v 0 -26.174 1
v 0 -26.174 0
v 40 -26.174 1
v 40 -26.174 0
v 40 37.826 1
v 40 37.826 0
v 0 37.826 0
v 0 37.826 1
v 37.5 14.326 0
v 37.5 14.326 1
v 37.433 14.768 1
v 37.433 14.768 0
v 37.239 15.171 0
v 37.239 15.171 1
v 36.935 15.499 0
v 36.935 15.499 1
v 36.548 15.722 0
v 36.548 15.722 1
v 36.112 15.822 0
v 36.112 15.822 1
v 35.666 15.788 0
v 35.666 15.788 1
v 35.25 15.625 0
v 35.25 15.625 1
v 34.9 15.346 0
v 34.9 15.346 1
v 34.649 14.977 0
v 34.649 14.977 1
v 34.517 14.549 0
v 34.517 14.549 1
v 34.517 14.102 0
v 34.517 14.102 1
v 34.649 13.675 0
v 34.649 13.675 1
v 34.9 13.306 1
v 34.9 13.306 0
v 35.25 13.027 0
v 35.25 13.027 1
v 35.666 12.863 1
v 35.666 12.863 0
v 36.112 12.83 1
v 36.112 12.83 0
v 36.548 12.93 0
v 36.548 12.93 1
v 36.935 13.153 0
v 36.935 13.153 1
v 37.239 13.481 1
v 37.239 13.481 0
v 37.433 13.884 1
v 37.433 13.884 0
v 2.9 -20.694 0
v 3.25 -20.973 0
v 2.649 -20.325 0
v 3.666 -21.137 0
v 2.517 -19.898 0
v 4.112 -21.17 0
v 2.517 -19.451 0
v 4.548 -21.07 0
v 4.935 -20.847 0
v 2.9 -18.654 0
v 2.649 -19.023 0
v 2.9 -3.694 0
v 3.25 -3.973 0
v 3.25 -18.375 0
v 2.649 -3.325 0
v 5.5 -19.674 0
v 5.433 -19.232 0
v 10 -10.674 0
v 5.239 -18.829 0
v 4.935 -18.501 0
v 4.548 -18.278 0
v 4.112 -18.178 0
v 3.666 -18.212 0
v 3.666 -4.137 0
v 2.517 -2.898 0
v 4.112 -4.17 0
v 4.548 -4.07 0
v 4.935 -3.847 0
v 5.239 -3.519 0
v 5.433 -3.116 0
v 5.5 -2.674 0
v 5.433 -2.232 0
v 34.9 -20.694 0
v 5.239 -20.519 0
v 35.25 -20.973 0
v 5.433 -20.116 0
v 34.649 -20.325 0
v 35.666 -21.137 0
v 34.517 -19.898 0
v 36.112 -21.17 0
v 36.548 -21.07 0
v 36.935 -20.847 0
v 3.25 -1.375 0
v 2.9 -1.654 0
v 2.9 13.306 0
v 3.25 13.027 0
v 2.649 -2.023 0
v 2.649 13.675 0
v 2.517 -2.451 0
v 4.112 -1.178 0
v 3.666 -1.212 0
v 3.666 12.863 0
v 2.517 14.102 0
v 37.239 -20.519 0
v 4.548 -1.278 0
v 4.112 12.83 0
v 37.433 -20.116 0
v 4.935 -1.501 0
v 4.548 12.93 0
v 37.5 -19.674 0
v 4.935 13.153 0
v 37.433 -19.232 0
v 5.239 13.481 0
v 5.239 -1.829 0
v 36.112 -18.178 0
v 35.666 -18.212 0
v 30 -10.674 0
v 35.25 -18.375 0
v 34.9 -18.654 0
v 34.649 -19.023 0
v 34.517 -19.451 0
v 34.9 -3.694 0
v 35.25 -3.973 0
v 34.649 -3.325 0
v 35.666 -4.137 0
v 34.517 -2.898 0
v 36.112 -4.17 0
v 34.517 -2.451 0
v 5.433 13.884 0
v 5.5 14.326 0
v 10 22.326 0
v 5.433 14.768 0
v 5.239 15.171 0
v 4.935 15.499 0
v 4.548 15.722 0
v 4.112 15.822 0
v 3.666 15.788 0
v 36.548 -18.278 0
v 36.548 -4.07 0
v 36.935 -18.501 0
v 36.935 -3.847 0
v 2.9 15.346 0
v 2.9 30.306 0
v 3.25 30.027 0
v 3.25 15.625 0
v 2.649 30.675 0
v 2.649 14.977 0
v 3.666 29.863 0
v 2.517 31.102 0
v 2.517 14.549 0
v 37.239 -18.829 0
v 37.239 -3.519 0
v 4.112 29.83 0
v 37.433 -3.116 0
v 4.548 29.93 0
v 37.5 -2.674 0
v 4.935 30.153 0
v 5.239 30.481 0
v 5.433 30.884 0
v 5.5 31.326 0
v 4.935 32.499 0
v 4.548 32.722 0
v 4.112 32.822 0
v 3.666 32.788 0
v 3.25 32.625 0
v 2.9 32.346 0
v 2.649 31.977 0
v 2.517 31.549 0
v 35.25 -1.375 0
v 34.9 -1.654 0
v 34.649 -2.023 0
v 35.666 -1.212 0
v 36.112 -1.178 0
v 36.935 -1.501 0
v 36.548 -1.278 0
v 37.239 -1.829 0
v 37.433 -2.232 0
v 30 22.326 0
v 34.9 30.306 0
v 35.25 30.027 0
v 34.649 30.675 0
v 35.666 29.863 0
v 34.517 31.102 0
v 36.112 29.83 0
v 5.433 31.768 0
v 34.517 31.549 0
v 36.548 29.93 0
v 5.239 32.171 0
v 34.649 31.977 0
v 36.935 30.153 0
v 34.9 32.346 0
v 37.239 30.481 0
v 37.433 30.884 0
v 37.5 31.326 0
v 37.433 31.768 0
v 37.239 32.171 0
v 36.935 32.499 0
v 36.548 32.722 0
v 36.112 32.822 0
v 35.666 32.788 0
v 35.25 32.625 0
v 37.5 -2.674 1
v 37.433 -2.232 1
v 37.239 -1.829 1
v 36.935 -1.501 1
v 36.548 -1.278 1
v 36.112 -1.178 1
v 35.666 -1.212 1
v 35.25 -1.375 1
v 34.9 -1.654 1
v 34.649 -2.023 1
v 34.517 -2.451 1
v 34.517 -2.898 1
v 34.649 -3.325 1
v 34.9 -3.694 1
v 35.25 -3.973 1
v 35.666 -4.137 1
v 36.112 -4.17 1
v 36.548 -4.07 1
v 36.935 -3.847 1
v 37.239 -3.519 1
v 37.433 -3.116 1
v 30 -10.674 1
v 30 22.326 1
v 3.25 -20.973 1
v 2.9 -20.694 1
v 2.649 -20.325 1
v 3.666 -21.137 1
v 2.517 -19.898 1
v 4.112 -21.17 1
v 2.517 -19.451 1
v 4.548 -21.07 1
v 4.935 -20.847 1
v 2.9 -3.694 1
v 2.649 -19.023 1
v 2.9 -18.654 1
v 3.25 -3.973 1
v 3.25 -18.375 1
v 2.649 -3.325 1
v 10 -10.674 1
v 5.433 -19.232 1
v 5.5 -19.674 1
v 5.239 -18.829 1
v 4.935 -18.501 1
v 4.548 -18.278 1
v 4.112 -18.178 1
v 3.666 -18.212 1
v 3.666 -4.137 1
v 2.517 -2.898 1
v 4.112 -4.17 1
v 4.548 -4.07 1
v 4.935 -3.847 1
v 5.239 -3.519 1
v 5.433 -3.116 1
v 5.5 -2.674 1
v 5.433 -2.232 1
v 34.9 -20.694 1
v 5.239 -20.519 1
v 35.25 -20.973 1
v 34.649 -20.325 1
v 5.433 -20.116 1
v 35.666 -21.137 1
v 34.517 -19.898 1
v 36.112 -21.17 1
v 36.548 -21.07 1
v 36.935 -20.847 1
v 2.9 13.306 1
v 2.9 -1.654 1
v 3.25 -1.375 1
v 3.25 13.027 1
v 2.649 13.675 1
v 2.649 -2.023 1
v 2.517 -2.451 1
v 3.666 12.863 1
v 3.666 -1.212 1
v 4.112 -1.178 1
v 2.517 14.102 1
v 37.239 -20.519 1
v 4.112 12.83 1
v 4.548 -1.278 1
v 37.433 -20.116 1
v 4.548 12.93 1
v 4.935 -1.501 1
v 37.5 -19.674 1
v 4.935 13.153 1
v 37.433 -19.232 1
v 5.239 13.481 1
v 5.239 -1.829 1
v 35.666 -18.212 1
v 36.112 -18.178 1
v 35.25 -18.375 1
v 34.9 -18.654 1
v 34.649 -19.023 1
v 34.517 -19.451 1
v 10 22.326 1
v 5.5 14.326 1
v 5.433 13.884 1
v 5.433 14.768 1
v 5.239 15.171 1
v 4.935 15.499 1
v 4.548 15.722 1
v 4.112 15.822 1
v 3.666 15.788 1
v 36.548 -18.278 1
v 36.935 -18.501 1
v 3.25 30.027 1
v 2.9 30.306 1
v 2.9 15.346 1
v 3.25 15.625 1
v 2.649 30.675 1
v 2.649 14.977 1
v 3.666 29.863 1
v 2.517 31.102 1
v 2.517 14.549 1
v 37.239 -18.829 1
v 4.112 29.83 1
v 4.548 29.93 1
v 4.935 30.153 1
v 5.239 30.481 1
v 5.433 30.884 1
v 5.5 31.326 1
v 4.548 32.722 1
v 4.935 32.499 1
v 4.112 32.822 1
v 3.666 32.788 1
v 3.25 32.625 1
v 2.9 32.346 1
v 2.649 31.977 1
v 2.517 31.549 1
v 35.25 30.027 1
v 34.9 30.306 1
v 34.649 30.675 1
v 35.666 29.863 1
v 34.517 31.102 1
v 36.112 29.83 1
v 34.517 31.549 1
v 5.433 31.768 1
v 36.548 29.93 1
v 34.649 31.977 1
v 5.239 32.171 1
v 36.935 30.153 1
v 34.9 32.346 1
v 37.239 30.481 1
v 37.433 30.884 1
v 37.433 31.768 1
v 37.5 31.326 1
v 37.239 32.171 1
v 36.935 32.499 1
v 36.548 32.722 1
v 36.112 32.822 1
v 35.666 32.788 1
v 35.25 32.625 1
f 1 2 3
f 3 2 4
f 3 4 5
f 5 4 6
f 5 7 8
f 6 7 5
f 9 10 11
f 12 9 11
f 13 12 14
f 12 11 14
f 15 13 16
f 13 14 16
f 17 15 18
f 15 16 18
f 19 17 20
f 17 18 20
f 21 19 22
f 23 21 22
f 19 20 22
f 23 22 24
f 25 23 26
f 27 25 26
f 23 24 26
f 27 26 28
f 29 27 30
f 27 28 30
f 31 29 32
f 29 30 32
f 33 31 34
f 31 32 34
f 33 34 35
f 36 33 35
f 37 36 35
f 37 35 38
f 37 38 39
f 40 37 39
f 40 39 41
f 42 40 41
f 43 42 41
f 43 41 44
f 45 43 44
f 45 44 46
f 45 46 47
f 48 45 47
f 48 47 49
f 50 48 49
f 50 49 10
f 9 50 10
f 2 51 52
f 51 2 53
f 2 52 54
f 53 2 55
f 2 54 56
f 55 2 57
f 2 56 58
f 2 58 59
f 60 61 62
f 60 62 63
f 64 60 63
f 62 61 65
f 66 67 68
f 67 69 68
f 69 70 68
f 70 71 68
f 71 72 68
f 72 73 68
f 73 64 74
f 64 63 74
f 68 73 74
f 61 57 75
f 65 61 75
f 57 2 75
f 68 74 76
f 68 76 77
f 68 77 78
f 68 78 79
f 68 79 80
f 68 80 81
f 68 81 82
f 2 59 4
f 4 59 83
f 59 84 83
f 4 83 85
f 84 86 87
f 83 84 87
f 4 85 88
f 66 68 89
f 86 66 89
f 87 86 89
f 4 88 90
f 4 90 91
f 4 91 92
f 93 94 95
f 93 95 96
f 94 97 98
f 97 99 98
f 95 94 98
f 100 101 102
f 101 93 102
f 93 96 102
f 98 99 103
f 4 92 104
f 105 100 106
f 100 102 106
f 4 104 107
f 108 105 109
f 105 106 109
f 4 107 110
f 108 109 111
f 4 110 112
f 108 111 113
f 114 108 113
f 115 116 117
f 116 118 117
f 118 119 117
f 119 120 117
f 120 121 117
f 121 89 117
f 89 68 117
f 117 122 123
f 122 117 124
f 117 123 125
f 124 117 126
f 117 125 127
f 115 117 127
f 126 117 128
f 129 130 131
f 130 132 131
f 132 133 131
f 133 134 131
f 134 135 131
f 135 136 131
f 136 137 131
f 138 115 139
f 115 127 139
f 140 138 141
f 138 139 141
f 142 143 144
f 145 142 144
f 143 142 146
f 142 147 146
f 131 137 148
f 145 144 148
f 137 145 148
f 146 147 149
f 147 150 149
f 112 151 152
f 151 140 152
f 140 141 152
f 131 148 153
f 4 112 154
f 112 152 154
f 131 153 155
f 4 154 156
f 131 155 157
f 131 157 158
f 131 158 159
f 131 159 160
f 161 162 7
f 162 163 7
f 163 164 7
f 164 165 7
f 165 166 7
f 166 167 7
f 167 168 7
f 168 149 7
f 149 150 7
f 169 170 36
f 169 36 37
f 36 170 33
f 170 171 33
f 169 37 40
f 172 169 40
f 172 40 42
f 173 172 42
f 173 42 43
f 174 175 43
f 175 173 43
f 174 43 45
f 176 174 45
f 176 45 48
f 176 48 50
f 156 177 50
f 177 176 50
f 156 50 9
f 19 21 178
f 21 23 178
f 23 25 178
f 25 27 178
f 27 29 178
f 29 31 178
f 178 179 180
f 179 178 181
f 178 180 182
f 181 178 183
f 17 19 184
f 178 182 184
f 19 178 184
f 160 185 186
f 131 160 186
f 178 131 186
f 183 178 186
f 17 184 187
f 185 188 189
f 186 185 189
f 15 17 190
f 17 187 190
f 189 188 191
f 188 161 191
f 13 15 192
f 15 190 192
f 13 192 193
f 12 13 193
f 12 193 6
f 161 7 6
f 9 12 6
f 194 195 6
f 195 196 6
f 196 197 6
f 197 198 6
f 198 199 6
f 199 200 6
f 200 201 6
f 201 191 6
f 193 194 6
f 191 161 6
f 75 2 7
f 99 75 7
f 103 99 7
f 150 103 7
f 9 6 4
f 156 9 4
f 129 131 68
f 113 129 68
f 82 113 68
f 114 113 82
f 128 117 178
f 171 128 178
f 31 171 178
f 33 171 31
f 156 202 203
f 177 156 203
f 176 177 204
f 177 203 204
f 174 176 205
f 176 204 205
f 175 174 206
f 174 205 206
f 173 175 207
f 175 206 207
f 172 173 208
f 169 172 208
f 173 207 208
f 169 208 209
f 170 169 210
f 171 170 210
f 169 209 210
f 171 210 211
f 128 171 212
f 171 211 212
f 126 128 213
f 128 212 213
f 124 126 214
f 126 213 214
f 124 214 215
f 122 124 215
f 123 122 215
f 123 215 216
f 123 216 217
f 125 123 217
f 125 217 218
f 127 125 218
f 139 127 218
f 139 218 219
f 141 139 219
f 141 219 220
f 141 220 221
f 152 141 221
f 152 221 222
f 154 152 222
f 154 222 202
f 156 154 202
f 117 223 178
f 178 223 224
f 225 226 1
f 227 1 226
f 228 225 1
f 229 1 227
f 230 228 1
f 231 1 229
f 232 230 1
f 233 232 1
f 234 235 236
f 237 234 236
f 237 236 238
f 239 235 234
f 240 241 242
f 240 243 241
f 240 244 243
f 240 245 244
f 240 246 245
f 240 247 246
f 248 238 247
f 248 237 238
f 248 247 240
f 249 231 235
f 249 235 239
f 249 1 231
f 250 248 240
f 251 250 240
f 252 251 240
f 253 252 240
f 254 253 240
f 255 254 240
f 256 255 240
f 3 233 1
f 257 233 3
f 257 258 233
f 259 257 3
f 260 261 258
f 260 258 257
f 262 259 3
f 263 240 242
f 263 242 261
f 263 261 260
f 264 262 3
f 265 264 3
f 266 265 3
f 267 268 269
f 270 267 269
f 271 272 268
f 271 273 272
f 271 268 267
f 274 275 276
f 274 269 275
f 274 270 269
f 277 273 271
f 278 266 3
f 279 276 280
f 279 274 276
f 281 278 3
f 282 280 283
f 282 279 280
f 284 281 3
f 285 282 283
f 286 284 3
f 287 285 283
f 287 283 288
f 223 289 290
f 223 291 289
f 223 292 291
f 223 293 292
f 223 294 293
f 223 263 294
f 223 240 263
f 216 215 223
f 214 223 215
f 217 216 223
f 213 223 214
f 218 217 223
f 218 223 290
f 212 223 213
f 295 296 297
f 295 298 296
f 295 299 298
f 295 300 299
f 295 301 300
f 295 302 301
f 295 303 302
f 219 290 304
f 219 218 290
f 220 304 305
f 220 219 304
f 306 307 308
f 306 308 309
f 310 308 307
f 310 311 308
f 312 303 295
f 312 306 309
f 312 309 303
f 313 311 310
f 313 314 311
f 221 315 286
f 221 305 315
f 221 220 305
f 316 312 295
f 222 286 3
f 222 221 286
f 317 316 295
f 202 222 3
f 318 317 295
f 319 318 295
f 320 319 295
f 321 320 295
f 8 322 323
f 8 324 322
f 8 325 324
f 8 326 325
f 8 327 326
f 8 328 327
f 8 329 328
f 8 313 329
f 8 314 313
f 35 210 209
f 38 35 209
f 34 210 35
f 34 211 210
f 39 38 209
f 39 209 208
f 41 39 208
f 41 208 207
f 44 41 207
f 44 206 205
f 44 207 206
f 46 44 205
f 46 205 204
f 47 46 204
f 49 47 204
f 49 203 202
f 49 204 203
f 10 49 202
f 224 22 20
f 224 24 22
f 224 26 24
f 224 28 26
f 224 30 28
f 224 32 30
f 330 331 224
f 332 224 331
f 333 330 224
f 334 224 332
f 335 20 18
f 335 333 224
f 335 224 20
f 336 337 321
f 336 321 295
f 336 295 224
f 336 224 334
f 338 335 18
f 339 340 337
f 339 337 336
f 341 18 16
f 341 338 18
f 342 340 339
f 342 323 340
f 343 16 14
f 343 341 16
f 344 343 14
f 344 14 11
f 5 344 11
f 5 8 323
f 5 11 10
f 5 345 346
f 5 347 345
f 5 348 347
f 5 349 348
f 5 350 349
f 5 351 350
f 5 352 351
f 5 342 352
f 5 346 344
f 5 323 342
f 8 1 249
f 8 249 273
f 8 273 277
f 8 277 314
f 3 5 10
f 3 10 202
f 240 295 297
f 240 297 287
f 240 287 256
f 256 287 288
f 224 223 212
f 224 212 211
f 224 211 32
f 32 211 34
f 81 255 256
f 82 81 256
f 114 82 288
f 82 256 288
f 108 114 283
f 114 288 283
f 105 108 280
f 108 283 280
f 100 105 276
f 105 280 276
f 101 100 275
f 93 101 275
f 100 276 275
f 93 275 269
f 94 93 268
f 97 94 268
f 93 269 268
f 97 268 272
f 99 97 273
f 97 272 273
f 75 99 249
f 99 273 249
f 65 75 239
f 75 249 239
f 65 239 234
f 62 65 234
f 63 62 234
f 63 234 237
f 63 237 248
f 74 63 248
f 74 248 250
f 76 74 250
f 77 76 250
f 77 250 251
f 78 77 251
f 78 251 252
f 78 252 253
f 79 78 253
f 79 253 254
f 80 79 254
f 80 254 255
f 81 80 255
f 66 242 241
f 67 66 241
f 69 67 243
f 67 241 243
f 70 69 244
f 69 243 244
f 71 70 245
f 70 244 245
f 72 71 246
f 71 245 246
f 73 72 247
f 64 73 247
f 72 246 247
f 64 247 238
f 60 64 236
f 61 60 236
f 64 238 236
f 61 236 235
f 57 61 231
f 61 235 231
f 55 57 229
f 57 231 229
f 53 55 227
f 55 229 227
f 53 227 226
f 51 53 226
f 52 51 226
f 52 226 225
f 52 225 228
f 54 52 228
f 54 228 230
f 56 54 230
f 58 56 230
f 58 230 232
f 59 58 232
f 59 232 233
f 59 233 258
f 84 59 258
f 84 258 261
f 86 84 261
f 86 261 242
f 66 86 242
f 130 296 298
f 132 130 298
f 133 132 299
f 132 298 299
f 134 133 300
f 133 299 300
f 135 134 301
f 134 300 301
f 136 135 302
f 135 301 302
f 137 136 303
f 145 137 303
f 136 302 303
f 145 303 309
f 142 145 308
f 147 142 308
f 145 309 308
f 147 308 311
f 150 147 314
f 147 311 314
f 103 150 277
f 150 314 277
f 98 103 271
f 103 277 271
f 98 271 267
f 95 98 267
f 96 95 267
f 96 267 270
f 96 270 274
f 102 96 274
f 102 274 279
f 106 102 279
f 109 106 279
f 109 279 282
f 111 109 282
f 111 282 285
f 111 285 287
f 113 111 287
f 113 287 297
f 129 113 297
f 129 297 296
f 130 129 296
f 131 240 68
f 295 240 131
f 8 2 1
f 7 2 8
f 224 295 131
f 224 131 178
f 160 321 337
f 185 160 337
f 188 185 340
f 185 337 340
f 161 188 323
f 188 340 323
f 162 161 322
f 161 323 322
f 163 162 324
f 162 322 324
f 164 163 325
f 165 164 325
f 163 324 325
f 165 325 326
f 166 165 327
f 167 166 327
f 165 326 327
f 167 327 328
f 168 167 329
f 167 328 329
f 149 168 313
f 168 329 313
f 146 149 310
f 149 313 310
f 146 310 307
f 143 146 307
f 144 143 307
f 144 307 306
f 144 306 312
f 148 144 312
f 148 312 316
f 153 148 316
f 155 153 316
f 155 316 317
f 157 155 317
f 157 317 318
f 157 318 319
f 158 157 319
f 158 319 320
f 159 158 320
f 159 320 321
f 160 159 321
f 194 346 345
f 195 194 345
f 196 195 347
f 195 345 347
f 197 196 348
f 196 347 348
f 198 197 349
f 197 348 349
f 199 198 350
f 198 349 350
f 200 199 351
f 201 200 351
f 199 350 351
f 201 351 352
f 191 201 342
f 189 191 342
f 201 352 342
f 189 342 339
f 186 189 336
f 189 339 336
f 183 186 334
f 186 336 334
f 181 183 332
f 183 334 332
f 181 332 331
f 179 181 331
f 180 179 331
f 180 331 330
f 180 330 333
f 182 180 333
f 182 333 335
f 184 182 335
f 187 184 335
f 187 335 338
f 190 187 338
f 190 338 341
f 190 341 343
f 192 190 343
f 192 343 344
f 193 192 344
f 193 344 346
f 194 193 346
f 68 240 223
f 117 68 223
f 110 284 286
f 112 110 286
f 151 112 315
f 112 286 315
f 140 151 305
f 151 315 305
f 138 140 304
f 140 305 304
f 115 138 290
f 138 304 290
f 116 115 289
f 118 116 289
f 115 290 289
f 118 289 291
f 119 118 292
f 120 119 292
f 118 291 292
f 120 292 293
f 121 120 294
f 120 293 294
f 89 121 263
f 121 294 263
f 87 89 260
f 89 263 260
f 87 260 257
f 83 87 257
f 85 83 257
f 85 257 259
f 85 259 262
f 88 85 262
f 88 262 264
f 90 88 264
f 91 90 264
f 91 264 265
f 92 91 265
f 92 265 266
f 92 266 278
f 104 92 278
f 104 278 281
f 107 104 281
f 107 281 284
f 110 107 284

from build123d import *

# Parameters (mm, degrees)
SKETCH1_W               = 40
SKETCH1_H               = 64
BOSS_EXTRUDE1_DEPTH     = 1
SKETCH2_W               = 20
SKETCH2_H               = 33
SKETCH2_R               = 1.5
CUT_EXTRUDE1_DEPTH      = 1
CUT_EXTRUDE1_DEPTH_BACK = 2


with BuildPart() as part:
    # Sketch1 → Boss-Extrude1 (new body)
    with BuildSketch(Plane.XY):
        with Locations((20, 5.82585752)):
            Rectangle(SKETCH1_W, SKETCH1_H)
    extrude(amount=BOSS_EXTRUDE1_DEPTH)

    # Sketch2 → Cut-Extrude1 (cut, two sides)
    with BuildSketch(Plane.XY.offset(1)) as cut_extrude1_sk:
        with Locations((20, 5.82585752)):
            Rectangle(SKETCH2_W, SKETCH2_H)
        with Locations((4, -19.67414248)):
            Circle(SKETCH2_R)
        with Locations((4, -2.67414248)):
            Circle(SKETCH2_R)
        with Locations((4, 14.32585752)):
            Circle(SKETCH2_R)
        with Locations((4, 31.32585752)):
            Circle(SKETCH2_R)
        with Locations((36, -19.67414248)):
            Circle(SKETCH2_R)
        with Locations((36, -2.67414248)):
            Circle(SKETCH2_R)
        with Locations((36, 14.32585752)):
            Circle(SKETCH2_R)
        with Locations((36, 31.32585752)):
            Circle(SKETCH2_R)
    extrude(amount=CUT_EXTRUDE1_DEPTH, mode=Mode.SUBTRACT)
    extrude(cut_extrude1_sk.sketch, amount=-CUT_EXTRUDE1_DEPTH_BACK, mode=Mode.SUBTRACT)


solid = part.part
